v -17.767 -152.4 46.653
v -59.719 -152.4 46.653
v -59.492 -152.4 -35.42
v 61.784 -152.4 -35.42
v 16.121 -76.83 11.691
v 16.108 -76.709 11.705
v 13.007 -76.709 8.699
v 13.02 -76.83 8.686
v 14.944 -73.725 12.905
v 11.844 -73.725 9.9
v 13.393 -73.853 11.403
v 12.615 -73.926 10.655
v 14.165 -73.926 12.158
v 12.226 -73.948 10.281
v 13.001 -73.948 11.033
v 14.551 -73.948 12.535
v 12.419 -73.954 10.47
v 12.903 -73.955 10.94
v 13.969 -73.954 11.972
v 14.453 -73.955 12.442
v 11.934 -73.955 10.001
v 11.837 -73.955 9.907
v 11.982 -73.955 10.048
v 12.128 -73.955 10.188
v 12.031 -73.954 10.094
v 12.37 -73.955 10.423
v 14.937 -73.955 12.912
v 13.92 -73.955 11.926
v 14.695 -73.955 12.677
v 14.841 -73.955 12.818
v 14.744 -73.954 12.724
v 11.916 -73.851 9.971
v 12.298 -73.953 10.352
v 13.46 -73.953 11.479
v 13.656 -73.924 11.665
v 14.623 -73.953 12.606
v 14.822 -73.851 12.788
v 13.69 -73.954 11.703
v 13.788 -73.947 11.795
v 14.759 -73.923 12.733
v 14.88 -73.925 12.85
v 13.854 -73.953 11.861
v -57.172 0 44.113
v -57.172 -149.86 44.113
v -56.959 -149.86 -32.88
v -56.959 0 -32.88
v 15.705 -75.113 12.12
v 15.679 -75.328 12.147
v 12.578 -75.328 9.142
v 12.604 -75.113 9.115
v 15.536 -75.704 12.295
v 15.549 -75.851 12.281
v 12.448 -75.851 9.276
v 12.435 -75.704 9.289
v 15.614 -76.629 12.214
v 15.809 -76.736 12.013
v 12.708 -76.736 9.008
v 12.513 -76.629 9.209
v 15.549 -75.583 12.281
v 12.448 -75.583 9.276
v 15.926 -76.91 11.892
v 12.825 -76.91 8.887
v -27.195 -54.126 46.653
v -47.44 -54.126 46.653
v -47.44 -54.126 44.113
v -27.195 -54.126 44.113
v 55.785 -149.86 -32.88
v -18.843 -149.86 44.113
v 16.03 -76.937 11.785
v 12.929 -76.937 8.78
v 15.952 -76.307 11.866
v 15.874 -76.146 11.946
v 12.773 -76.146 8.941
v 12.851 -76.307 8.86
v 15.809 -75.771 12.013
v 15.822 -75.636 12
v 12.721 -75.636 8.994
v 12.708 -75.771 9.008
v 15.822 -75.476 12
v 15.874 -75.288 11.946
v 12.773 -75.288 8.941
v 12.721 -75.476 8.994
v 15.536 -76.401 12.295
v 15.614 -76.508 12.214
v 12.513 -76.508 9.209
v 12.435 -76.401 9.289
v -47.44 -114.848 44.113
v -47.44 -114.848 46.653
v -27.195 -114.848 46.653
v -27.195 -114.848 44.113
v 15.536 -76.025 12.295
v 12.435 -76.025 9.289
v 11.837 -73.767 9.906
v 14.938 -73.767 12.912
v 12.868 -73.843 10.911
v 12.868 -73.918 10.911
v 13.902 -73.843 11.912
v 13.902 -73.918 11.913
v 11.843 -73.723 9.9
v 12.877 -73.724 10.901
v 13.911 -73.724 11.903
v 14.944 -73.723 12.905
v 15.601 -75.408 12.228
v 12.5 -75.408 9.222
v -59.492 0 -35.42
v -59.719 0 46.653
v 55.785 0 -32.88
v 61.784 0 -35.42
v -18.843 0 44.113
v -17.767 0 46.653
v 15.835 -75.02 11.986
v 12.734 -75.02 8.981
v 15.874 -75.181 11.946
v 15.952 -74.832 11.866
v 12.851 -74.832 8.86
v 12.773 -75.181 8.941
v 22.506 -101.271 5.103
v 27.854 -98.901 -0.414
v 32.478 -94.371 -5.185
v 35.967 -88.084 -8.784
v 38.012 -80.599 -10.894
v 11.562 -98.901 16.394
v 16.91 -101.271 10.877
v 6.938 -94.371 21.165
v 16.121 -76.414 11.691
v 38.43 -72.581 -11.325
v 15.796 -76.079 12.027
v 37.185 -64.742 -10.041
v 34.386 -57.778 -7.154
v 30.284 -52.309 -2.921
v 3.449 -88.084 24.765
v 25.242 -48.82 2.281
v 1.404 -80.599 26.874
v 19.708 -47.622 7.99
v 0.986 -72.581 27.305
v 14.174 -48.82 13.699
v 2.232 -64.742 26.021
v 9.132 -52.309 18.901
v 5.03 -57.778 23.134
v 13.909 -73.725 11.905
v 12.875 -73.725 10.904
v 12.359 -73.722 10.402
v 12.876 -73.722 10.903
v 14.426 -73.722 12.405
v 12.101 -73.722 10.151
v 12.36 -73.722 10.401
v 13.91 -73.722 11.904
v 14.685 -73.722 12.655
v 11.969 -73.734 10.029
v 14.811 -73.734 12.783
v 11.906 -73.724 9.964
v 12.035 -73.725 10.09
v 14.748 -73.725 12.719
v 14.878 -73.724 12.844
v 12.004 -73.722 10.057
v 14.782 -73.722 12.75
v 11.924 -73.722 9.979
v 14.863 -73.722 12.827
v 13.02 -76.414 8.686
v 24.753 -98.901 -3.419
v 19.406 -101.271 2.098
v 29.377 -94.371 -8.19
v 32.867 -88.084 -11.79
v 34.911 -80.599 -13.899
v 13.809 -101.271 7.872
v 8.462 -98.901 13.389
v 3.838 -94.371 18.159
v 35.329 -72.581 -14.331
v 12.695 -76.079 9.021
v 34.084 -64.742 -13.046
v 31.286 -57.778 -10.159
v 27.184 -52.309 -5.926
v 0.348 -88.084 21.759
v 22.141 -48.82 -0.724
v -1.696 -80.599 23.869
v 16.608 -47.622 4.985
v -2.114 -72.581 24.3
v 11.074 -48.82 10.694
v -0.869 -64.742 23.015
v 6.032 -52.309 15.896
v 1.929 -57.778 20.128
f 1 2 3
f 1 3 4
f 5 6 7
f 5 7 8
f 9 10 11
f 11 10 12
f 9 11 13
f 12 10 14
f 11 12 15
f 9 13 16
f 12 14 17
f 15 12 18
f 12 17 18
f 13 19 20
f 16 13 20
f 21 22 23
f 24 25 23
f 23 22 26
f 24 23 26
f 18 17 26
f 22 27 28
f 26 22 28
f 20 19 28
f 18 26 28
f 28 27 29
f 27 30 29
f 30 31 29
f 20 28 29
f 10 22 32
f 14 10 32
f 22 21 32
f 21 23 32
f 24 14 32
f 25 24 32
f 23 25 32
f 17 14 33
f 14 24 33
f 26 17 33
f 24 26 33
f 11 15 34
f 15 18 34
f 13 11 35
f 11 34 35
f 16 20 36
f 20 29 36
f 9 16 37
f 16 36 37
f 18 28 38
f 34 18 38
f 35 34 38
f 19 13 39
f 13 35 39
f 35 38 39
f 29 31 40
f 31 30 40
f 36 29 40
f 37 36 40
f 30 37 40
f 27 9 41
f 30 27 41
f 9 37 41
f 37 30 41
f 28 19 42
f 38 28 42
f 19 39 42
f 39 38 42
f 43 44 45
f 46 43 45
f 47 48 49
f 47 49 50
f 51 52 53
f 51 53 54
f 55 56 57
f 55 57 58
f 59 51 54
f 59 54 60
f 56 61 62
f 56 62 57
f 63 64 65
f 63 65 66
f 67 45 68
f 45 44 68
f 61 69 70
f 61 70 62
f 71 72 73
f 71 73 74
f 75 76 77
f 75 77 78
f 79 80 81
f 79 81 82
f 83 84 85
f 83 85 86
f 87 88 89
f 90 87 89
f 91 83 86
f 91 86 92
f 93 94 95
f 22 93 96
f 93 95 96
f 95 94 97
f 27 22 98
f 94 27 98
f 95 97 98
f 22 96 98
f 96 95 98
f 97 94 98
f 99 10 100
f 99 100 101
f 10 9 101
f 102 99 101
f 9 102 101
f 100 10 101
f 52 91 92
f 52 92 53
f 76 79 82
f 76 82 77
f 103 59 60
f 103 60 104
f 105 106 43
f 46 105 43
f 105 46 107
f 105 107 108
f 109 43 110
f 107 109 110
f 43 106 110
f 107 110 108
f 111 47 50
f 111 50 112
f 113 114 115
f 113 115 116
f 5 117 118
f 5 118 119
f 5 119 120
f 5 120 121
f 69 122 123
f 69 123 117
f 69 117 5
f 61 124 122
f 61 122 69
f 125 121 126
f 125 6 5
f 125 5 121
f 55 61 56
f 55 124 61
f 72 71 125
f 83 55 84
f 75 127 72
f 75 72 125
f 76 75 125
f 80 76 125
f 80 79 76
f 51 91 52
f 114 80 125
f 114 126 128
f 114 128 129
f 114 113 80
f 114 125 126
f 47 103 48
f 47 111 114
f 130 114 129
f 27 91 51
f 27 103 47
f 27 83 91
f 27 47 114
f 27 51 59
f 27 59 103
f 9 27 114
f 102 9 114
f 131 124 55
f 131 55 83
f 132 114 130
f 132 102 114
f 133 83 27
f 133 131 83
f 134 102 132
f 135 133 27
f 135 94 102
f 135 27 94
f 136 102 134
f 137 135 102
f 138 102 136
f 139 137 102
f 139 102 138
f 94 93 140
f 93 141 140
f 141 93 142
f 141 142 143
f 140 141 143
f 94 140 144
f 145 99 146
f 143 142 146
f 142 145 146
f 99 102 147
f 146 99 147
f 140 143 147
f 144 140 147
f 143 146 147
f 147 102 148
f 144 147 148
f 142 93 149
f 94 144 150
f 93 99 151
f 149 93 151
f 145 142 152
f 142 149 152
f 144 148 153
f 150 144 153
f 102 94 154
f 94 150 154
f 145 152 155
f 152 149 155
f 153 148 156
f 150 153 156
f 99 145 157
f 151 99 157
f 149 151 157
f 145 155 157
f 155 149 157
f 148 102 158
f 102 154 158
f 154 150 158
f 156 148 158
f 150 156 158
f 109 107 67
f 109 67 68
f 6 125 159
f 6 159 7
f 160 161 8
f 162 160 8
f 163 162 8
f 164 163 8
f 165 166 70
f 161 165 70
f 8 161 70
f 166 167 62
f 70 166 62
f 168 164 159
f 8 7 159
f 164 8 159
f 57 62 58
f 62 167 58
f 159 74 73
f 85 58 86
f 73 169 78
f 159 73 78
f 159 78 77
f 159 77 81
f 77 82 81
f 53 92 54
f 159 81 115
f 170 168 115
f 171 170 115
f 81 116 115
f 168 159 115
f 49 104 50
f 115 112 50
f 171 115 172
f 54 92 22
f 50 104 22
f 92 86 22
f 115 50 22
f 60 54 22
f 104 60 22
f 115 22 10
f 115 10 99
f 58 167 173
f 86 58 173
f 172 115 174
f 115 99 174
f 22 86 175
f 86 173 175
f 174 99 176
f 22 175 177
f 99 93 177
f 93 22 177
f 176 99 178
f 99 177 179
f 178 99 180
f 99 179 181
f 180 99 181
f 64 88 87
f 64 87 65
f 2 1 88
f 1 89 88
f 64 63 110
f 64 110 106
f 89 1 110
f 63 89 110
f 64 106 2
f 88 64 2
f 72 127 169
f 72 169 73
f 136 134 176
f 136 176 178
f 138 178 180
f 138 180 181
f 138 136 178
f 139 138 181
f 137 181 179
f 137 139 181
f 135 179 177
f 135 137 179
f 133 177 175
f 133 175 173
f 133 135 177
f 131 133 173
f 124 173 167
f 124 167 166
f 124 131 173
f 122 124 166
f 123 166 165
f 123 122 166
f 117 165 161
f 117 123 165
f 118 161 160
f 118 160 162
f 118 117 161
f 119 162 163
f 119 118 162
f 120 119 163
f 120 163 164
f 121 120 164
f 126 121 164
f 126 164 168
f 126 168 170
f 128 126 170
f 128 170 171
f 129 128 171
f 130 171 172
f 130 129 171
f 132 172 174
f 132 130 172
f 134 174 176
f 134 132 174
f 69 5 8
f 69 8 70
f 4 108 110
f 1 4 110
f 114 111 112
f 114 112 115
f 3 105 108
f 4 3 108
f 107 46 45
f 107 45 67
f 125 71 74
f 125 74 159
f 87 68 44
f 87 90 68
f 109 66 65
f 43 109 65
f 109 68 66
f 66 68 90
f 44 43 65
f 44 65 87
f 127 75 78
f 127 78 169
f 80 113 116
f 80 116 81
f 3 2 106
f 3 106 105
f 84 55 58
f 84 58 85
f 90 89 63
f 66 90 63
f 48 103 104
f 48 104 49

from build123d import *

# Parameters (mm, degrees)
F1_DEPTH = 152.4
F2_T     = -2.54
F3_R     = 26.9750626094
F5_DEPTH = 4.318
F4_W     = 20.2446002513
F4_H     = 60.7213377953
F6_DEPTH = 25.4


# Not quite as in the source:
# - a feature names something its author has since deleted; it is built from what else it names


with BuildPart() as f1:
    # F0 (on Front) → F1 (new body)
    with BuildSketch(Plane.XZ):
        Polygon((-59.7190245772, 46.653393656), (-59.4916790724, -35.4198999703), (61.7842264473, -35.4198999703), (-17.7672635764, 46.653393656), align=None)
    extrude(amount=F1_DEPTH)

    # F2
    f2_openings = [f1.faces().sort_by_distance(p)[0] for p in [
        (-15.567576, 0, -1.030813),
    ]]
    offset(amount=F2_T, openings=f2_openings)

    # F4 (on face) → F6 (cut)
    with BuildSketch(Plane.XY.offset(46.653393656)):
        with Locations((-37.3173421249, -84.4868421555)):
            Rectangle(F4_W, F4_H)
    extrude(amount=-F6_DEPTH, mode=Mode.SUBTRACT)


with BuildPart() as f5:
    # F3 (on face) → F5 (new body)
    with BuildSketch(Plane(origin=(14.1545580436, 0, 13.7196417159), x_dir=(0, 1, 0), z_dir=(0.7180522473, 0, 0.6959892026))):
        with Locations((-74.5968669653, -7.9793436453)):
            Circle(F3_R)
        Polygon((-76.937161386, -2.6940456592), (-76.9103467464, -2.5446491782), (-76.7360180616, -2.3765773512), (-76.6287446022, -2.096457174), (-76.5080600977, -2.096457174), (-76.4007866383, -1.9844097551), (-76.2398764491, -1.9844097551), (-76.0253220797, -1.9844097551), (-75.8510008454, -2.0030839369), (-75.7035017014, -1.9844097551), (-75.5828171968, -2.0030839369), (-75.4084959626, -2.0777829923), (-75.3280371428, -2.1898308769), (-75.1134902239, -2.2271808702), (-75.0196203589, -2.4139273446), (-74.8318955302, -2.581997076), (-75.1805379987, -2.4699498899), (-75.2878114581, -2.4699498899), (-75.4755437374, -2.3952506017), (-75.6364539266, -2.3952506017), (-75.7705494761, -2.3765773512), (-76.07896626, -2.3579027038), (-76.1460065842, -2.4699498899), (-76.3069242239, -2.581997076), (-76.4141976833, -2.8247681912), (-76.7092034221, -2.8060935438), (-76.8298879266, -2.8247681912), align=None, mode=Mode.SUBTRACT)
        with BuildLine():
            add(Edge.make_bspline(
                [(-73.7227074314, -1.1341697216), (-73.7176566552, -1.1319269484), (-73.7365462125, -1.127884318), (-73.7668424845, -1.1252524959)],
                knots=[0.0171389283, 0.0171389283, 0.0171389283, 0.0171389283, 0.1852596656, 0.1852596656, 0.1852596656, 0.1852596656], degree=3))
            add(Edge.make_bspline(
                [(-73.7250118097, -1.1347961173), (-73.7239860284, -1.1346082917), (-73.7232223286, -1.1343983593), (-73.7227074314, -1.1341697216)],
                knots=[0, 0, 0, 0, 0.0171389283, 0.0171389283, 0.0171389283, 0.0171389283], degree=3))
            add(Edge.make_bspline(
                [(-73.9545275863, -1.1243682694), (-73.9548856484, -1.1246478129), (-73.9510749235, -1.1298427137), (-73.7506281888, -1.1394866026), (-73.7250118097, -1.1347961173)],
                knots=[0.5462143148, 0.5462143148, 0.5462143148, 0.5462143148, 0.5719972033, 1, 1, 1, 1], degree=3))
            add(Edge.make_bspline(
                [(-73.7668424845, -1.1252524959), (-73.8318884771, -1.1196019828), (-73.9495147977, -1.1204547232), (-73.9545275863, -1.1243682694)],
                knots=[0.1852596656, 0.1852596656, 0.1852596656, 0.1852596656, 0.5462143148, 0.5462143148, 0.5462143148, 0.5462143148], degree=3))
        make_face(mode=Mode.SUBTRACT)
    extrude(amount=-F5_DEPTH)


solid = Compound([f1.part, f5.part])
